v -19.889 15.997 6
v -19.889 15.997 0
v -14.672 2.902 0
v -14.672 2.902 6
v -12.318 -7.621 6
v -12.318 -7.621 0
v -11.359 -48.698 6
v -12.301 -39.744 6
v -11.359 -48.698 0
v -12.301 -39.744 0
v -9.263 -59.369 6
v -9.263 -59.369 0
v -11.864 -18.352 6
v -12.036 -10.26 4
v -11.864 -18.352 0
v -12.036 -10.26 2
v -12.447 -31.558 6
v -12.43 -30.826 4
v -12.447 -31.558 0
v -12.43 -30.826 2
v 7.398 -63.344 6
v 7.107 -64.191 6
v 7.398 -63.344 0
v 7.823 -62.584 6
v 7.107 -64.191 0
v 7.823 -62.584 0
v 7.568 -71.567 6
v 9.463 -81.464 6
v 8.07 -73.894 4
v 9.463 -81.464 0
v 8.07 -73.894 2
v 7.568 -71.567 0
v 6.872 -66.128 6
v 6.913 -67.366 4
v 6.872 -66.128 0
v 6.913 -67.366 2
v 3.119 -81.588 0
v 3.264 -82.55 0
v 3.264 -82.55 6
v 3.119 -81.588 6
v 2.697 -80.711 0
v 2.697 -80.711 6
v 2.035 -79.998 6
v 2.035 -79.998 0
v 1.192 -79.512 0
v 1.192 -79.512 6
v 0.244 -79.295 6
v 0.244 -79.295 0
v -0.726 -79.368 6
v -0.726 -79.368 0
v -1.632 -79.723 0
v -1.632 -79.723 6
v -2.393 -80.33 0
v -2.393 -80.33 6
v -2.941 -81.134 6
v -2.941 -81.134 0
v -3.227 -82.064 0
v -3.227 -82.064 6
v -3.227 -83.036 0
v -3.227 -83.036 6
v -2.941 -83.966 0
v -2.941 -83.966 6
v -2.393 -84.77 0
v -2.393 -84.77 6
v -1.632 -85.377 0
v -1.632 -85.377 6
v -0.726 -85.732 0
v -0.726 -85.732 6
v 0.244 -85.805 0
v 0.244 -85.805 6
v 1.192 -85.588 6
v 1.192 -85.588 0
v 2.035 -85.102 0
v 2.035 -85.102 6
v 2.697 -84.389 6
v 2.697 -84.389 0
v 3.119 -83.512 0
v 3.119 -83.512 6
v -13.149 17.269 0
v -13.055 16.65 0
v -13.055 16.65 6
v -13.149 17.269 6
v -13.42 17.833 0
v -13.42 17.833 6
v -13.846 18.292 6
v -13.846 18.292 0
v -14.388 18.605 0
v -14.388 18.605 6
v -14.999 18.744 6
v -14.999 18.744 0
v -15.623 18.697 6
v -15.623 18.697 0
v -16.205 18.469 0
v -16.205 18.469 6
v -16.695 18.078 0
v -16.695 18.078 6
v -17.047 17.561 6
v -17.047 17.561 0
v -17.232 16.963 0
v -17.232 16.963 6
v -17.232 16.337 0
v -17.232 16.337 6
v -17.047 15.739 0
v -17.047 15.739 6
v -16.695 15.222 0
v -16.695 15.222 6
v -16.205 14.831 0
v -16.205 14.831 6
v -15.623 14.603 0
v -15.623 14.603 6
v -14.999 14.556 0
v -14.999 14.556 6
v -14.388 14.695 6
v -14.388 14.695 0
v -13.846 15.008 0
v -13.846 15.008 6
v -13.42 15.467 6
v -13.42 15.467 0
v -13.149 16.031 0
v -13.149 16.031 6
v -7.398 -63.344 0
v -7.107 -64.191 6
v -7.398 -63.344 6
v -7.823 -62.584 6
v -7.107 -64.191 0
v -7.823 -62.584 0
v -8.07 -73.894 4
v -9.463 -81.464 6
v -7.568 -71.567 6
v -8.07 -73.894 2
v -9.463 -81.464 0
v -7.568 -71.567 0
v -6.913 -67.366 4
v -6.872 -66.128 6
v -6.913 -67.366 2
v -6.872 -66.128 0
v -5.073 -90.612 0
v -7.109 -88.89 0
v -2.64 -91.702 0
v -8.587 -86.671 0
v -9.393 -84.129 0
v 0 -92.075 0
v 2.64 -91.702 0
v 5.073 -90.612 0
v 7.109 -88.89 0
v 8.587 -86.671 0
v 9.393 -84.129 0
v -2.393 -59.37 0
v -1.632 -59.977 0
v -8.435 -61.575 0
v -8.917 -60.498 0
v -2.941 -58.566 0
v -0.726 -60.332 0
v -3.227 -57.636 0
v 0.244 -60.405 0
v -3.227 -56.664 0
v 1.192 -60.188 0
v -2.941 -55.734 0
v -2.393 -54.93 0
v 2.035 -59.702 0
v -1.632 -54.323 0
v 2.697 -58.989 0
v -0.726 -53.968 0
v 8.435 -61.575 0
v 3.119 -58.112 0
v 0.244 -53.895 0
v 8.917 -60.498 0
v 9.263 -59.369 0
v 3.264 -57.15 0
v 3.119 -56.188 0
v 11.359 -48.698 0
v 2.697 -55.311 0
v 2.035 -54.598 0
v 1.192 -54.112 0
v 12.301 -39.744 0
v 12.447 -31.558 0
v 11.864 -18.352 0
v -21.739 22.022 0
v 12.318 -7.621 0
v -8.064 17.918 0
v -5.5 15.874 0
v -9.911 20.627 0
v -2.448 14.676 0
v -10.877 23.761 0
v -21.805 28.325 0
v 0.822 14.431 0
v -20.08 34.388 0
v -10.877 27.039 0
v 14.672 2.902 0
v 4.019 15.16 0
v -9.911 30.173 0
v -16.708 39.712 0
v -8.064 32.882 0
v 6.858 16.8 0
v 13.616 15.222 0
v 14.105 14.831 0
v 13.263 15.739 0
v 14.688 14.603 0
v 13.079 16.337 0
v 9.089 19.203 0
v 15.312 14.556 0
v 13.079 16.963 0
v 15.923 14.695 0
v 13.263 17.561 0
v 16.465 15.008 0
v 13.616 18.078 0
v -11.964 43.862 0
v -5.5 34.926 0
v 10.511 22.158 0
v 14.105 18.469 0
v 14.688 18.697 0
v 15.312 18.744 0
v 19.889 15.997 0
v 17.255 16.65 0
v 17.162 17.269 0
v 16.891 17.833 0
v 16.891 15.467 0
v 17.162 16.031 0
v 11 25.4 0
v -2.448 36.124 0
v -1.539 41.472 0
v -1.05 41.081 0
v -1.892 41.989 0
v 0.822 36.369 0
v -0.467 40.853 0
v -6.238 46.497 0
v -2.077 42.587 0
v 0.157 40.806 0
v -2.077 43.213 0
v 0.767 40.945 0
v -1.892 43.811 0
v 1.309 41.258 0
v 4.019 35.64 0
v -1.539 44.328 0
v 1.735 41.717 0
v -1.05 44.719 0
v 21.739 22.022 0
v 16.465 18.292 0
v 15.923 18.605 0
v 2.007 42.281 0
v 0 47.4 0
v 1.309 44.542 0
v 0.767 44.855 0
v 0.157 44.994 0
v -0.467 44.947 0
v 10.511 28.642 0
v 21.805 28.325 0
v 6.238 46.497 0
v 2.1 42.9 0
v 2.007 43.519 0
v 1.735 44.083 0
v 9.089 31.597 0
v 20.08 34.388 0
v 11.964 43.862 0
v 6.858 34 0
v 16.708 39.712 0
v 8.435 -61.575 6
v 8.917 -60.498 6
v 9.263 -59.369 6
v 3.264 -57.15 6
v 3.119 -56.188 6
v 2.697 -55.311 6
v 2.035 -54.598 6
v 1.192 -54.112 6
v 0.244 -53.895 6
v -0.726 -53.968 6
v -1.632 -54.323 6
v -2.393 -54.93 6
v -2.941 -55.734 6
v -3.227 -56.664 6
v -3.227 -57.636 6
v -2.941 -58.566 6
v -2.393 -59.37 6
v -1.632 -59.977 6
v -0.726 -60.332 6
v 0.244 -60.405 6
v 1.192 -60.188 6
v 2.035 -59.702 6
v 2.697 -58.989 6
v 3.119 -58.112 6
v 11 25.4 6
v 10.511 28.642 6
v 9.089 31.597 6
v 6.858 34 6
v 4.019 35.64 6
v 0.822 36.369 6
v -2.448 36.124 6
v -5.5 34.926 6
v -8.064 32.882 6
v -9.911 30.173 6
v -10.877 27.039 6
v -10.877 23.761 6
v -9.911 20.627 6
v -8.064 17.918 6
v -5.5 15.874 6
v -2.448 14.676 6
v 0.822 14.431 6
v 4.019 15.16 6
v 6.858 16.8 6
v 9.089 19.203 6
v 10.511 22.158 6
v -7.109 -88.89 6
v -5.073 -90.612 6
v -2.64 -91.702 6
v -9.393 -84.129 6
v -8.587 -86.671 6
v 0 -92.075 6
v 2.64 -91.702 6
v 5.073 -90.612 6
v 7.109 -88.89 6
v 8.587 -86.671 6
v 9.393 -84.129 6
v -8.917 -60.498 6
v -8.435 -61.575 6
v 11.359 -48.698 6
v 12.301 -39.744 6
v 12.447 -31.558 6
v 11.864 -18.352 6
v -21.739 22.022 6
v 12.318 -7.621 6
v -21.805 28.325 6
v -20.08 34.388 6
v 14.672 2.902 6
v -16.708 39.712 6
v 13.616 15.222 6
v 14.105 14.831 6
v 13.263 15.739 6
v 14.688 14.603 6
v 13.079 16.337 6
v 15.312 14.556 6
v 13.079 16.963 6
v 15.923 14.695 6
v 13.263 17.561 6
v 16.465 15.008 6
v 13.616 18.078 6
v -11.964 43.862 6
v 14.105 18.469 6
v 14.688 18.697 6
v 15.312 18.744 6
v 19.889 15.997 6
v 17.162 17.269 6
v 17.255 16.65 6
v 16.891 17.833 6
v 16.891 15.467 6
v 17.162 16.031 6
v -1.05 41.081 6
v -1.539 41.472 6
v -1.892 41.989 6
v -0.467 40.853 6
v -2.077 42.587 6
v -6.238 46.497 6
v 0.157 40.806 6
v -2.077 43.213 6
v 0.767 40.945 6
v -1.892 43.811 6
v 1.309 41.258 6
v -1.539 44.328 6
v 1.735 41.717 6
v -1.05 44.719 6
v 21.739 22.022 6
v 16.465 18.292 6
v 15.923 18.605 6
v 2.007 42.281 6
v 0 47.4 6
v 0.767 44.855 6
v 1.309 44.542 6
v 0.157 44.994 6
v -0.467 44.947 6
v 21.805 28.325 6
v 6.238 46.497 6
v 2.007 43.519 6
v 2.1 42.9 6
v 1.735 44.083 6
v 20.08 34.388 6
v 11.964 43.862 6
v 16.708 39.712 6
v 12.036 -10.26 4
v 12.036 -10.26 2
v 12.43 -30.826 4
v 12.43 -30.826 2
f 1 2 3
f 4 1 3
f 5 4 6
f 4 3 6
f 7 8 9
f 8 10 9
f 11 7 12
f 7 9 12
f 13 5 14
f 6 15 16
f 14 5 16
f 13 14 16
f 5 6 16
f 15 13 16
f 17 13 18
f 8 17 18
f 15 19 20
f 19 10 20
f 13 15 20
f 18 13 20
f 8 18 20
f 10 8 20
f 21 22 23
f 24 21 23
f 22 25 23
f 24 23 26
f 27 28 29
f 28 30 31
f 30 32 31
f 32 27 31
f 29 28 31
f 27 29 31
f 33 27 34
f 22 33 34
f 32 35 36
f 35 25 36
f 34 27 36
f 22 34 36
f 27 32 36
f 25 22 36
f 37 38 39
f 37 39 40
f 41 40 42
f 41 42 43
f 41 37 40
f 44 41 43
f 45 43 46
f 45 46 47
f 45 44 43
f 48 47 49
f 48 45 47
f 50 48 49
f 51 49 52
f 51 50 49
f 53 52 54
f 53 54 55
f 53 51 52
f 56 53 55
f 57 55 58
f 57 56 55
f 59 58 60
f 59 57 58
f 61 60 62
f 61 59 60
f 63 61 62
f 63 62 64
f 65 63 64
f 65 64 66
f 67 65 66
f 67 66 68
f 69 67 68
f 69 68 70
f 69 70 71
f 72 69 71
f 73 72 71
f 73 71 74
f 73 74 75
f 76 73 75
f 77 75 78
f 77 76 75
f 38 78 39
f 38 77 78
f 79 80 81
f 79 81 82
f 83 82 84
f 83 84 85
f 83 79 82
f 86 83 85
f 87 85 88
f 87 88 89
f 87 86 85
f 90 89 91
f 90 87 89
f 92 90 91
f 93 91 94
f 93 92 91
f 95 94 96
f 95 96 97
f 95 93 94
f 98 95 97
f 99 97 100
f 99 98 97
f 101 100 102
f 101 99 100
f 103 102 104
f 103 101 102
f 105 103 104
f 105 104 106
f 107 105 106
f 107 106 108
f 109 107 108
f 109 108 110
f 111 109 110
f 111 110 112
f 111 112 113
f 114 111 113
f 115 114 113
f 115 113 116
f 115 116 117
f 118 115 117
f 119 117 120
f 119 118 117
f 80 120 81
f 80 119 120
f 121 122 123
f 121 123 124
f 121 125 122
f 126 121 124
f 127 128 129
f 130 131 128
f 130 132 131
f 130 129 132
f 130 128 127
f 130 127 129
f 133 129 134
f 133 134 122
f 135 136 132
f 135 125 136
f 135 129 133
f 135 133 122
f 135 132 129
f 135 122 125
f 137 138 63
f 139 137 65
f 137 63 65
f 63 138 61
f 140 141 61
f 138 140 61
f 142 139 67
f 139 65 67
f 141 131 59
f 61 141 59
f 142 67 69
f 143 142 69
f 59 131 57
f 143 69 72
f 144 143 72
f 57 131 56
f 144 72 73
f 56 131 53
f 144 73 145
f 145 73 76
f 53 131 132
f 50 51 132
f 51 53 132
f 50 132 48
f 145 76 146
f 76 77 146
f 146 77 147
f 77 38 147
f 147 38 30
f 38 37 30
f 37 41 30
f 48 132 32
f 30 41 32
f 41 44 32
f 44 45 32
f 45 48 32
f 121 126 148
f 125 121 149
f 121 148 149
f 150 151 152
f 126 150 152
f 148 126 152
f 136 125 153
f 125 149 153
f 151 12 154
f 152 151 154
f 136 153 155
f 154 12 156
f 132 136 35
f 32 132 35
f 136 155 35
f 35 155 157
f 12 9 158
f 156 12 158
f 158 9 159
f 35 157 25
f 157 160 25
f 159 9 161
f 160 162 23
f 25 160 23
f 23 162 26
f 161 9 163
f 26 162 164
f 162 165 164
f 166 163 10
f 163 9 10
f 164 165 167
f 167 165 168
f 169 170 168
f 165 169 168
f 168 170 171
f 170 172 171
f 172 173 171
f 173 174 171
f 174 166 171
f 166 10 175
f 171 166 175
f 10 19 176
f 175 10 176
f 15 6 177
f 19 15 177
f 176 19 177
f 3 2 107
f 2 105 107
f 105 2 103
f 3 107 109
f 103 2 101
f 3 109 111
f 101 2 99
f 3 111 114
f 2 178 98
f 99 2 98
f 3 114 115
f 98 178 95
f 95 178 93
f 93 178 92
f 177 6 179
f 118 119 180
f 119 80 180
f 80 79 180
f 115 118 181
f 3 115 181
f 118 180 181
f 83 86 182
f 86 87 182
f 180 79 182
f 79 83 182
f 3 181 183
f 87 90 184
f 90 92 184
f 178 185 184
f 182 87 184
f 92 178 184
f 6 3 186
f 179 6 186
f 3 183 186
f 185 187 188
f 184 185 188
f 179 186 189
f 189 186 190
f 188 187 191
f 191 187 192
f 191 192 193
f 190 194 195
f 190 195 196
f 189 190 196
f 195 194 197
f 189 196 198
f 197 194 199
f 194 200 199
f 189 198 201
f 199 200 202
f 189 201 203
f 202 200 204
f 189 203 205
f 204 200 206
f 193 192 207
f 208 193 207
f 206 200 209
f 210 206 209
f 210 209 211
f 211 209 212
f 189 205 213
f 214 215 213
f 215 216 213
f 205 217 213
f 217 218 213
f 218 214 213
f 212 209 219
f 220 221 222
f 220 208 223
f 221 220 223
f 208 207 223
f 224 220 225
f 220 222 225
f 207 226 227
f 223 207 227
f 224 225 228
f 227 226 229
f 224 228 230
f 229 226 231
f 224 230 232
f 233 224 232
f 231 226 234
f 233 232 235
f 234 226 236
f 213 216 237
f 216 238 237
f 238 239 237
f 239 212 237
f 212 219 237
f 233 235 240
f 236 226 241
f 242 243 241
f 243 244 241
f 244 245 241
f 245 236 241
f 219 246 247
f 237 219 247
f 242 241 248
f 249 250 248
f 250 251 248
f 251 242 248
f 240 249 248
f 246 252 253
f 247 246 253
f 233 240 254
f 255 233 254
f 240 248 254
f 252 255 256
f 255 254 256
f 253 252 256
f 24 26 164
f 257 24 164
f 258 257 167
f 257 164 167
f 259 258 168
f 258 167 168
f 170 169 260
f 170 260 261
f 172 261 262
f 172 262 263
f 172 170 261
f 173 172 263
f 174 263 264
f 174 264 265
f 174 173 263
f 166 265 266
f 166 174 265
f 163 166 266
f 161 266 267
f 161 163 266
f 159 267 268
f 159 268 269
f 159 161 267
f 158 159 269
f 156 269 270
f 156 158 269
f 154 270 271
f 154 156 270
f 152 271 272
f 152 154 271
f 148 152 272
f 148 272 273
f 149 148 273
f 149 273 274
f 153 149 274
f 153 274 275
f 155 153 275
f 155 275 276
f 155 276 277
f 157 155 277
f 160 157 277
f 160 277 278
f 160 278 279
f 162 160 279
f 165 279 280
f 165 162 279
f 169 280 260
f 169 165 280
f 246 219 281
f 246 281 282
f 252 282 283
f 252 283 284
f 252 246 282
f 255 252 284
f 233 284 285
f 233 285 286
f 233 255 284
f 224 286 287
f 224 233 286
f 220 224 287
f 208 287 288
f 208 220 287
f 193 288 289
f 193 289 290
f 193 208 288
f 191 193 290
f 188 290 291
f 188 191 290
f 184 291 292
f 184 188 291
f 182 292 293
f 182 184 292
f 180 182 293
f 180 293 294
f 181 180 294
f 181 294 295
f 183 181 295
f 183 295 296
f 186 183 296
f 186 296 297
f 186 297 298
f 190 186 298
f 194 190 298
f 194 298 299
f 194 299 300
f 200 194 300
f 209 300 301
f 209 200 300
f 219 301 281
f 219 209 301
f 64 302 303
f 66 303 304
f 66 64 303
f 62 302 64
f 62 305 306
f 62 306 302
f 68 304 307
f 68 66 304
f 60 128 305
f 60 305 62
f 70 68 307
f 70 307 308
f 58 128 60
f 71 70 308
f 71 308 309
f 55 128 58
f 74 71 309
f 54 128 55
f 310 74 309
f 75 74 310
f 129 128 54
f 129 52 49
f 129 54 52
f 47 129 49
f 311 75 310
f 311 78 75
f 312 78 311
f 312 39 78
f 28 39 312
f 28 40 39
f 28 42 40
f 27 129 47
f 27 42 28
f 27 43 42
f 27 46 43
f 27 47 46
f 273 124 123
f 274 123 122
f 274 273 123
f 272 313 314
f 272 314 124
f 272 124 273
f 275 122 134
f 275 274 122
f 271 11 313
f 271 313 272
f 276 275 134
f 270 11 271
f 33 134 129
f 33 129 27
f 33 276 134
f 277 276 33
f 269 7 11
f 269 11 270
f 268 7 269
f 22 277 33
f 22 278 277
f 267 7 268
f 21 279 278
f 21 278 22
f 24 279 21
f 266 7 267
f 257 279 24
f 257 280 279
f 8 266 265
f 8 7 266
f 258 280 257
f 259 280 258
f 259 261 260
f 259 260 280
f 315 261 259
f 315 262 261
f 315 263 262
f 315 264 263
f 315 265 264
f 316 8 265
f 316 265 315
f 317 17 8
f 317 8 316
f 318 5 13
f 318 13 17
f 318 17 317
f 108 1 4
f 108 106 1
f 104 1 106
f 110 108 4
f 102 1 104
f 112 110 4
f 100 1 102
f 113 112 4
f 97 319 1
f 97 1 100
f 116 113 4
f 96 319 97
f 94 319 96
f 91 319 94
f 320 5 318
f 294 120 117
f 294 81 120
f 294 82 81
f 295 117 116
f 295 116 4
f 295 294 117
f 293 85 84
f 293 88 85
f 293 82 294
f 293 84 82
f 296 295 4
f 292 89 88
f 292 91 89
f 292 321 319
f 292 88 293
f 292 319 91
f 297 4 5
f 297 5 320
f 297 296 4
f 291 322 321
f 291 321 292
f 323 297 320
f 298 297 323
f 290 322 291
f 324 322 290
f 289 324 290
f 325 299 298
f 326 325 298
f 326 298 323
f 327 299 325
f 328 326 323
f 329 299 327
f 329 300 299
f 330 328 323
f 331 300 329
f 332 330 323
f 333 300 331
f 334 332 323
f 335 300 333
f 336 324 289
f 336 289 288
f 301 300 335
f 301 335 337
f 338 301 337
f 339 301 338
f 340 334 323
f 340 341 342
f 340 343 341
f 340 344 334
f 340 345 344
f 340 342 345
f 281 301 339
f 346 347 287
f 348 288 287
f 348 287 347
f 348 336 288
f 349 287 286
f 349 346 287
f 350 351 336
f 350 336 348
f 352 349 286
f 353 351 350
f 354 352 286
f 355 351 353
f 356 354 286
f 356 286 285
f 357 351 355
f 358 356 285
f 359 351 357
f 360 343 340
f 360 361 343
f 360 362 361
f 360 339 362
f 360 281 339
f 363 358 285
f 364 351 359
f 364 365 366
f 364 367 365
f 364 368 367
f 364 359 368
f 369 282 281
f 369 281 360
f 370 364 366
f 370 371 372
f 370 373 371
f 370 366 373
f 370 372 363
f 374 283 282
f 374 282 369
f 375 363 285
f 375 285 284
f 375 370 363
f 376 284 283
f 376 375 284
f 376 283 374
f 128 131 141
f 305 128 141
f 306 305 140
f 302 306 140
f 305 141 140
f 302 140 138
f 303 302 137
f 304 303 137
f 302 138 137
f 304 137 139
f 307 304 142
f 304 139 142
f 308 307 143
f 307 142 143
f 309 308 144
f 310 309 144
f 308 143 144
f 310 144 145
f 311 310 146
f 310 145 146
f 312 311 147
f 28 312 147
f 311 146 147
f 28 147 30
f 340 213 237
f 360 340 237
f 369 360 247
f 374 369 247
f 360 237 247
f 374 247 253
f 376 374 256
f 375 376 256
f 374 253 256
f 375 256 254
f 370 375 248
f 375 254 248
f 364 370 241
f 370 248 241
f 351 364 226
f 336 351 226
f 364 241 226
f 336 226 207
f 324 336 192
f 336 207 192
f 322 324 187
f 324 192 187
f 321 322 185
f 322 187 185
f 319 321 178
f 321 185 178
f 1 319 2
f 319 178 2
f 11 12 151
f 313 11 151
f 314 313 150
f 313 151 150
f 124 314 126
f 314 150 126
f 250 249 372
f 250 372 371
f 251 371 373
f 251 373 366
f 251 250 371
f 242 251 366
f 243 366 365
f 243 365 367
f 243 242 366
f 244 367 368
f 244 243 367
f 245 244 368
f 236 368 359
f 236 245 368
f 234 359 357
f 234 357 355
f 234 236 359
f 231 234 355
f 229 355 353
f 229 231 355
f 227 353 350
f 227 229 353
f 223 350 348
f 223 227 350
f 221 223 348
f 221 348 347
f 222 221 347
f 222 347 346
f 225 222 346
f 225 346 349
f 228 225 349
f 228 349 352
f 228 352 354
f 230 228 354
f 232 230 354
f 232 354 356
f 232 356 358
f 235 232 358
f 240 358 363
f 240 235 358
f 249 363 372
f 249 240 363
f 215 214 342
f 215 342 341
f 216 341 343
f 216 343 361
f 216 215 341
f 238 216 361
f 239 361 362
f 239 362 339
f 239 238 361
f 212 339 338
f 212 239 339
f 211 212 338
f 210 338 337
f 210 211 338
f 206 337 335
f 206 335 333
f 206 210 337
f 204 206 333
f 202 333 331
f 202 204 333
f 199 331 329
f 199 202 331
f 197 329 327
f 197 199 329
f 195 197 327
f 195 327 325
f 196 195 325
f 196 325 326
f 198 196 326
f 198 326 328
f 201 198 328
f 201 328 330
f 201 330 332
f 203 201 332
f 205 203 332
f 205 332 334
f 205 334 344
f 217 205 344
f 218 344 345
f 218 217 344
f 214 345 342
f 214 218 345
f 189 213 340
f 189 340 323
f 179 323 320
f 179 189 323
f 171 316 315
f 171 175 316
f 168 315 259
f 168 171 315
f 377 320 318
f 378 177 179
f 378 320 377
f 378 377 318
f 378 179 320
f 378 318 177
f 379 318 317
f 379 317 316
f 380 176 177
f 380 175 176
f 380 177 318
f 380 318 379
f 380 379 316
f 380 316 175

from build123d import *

# Parameters (mm, degrees)
SKETCH1_R           = 2.1
SKETCH1_R_2         = 11
SKETCH1_R_3         = 3.2639
BOSS_EXTRUDE1_DEPTH = 6


with BuildPart() as part:
    # Sketch1 → Boss-Extrude1 (new body)
    with BuildSketch(Plane.XY):
        with BuildLine():
            ThreePointArc((19.889218642, 15.996863194), (0, 47.4), (-19.889218642, 15.996863194))
            add(Edge.make_bspline(
                [(-19.889218642, 15.996863194), (-3.976229329, -17.66179032), (-18.147711497, -22.281552166), (-9.262906138, -59.369052697)],
                knots=[0, 0, 0, 0, 1, 1, 1, 1], degree=3))
            ThreePointArc((-9.262906138, -59.369052697), (-8.692742138, -61.0438232), (-7.822687238, -62.584260701))
            add(Edge.make_bspline(
                [(-9.462887275, -81.464003027), (-8.561282023, -73.607821952), (-5.270691934, -66.257890325), (-7.822687238, -62.584260701)],
                knots=[0, 0, 0, 0, 1, 1, 1, 1], degree=3))
            ThreePointArc((-9.462887275, -81.464003027), (0, -92.075), (9.462887275, -81.464003027))
            add(Edge.make_bspline(
                [(9.462887275, -81.464003027), (8.561282023, -73.607821952), (5.270691934, -66.257890325), (7.822687238, -62.584260701)],
                knots=[0, 0, 0, 0, 1, 1, 1, 1], degree=3))
            ThreePointArc((7.822687238, -62.584260701), (8.692742138, -61.0438232), (9.262906138, -59.369052697))
            add(Edge.make_bspline(
                [(19.889218642, 15.996863194), (3.976229329, -17.66179032), (18.147711497, -22.281552166), (9.262906138, -59.369052697)],
                knots=[0, 0, 0, 0, 1, 1, 1, 1], degree=3))
        make_face()
        with Locations((-15.155444566, 16.65)):
            Circle(SKETCH1_R, mode=Mode.SUBTRACT)
        with Locations((0, 42.9)):
            Circle(SKETCH1_R, mode=Mode.SUBTRACT)
        with Locations((0, 25.4)):
            Circle(SKETCH1_R_2, mode=Mode.SUBTRACT)
        with Locations((15.155444566, 16.65)):
            Circle(SKETCH1_R, mode=Mode.SUBTRACT)
        with Locations((0, -57.15)):
            Circle(SKETCH1_R_3, mode=Mode.SUBTRACT)
        with Locations((0, -82.55)):
            Circle(SKETCH1_R_3, mode=Mode.SUBTRACT)
    extrude(amount=BOSS_EXTRUDE1_DEPTH)


solid = part.part
